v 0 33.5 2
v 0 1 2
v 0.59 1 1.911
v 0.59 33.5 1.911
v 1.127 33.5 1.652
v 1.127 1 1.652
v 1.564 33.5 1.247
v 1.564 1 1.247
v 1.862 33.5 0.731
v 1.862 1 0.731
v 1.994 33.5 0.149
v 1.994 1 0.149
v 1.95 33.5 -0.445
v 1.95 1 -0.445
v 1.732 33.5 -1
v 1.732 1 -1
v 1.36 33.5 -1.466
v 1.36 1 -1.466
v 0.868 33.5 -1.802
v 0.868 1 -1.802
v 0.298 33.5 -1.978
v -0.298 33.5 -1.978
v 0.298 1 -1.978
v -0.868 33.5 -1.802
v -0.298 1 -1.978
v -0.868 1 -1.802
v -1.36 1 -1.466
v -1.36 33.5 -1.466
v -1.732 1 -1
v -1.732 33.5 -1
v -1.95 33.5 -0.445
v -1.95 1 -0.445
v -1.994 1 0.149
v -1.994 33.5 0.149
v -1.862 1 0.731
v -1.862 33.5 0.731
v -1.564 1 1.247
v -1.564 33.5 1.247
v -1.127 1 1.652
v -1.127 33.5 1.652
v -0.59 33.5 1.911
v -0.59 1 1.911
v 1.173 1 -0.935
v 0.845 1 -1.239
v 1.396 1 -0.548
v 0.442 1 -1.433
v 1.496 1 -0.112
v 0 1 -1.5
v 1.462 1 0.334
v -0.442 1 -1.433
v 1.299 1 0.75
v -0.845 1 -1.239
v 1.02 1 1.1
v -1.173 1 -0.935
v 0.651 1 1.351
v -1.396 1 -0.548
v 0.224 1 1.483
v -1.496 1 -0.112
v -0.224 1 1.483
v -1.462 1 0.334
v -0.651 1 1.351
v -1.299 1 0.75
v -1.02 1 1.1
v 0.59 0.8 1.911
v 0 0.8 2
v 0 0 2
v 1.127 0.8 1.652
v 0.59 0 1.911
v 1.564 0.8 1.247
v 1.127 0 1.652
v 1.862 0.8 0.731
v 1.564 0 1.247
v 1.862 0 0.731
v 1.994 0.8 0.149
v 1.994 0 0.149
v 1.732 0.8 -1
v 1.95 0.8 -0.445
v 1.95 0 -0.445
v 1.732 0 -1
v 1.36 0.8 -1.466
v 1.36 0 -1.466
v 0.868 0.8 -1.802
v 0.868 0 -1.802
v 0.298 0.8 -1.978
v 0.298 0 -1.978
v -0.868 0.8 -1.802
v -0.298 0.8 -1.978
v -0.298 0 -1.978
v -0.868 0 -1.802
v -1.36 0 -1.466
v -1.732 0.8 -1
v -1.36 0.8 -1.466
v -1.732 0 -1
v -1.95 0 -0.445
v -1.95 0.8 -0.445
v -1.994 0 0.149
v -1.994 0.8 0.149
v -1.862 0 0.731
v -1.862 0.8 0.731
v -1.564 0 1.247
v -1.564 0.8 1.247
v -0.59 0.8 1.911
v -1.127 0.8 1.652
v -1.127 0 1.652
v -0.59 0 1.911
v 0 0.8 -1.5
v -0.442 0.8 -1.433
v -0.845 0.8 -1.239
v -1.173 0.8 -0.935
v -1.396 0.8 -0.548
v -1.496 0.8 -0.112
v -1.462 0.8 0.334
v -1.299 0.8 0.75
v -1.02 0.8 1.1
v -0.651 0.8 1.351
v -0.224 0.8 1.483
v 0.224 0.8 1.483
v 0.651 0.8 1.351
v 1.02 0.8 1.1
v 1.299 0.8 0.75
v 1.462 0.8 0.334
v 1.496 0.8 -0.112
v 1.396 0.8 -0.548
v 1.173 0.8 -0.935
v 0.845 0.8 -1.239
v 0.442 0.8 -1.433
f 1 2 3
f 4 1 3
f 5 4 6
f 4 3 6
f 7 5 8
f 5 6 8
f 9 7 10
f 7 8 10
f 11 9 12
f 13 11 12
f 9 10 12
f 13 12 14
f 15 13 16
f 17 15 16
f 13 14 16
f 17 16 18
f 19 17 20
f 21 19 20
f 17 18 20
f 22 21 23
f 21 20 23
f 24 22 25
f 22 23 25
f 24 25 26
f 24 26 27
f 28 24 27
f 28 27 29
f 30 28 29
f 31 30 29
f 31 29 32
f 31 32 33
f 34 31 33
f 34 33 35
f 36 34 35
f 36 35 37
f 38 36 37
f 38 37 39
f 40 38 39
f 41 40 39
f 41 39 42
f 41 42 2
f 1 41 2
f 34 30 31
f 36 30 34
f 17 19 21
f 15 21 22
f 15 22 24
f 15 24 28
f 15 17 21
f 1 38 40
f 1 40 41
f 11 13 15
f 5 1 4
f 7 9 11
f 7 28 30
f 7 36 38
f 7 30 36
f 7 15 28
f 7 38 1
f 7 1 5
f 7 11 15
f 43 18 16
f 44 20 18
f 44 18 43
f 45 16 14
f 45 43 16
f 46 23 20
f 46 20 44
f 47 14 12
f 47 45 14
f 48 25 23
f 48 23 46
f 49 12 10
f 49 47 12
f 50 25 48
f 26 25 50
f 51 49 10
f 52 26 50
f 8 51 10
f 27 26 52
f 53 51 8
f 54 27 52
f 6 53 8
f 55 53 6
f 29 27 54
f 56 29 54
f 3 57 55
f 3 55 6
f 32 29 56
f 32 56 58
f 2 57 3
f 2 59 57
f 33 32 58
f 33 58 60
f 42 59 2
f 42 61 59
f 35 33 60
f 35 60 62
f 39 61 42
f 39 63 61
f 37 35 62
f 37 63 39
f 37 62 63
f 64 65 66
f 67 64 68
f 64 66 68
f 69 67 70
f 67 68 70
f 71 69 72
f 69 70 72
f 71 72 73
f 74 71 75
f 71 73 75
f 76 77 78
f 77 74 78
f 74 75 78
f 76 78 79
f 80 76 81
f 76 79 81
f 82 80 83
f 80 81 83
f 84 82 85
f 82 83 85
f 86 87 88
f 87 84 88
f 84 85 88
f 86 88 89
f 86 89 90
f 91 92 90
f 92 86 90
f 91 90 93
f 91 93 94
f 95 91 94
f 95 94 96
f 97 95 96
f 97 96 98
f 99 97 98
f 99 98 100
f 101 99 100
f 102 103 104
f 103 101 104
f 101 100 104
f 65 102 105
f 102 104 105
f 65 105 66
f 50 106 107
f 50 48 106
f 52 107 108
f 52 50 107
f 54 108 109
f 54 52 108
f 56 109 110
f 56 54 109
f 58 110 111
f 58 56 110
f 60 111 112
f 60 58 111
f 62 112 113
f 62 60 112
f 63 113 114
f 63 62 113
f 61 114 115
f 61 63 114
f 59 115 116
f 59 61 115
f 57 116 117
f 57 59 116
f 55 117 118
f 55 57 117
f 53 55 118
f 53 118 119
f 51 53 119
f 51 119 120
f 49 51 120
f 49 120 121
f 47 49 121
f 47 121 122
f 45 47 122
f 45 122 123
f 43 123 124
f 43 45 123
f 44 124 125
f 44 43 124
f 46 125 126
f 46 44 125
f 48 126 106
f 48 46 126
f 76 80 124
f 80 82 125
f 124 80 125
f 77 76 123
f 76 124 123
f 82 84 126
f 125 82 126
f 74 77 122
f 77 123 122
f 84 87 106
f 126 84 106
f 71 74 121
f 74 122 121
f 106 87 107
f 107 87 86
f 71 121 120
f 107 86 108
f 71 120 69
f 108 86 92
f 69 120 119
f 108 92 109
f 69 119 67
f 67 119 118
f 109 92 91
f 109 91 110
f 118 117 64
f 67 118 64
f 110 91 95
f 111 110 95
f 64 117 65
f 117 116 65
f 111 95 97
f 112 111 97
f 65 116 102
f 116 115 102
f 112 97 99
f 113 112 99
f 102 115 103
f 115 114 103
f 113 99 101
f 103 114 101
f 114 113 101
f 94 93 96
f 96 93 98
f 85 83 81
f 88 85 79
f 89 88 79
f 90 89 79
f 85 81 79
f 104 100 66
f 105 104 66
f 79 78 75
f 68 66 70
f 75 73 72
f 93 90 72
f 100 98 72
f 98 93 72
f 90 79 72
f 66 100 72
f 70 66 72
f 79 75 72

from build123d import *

# Parameters (mm, degrees)
SKETCH1_R           = 2
BOSS_EXTRUDE1_DEPTH = 33.5
SKETCH2_W           = 0.5
SKETCH2_H           = 0.2


with BuildPart() as part:
    # Sketch1 → Boss-Extrude1 (new body)
    with BuildSketch(Plane(origin=(0, 0, 0), x_dir=(1, 0, 0), z_dir=(0, 1, 0))):
        with Locations(Location((0, 0, 0), (0, 0, 270))):
            Circle(SKETCH1_R)
    extrude(amount=BOSS_EXTRUDE1_DEPTH)

    # Sketch2 → Cut-Revolve1 (revolve, cut)
    with BuildSketch(Plane.XY, mode=Mode.PRIVATE) as cut_revolve1_sk:
        with Locations((1.75, 0.9)):
            Rectangle(SKETCH2_W, SKETCH2_H)
    revolve(cut_revolve1_sk.sketch.rotate(Axis((0, -1.7, 0), (0, 1, 0)), 90), axis=Axis((0, -1.7, 0), (0, 1, 0)), mode=Mode.SUBTRACT)


solid = part.part
